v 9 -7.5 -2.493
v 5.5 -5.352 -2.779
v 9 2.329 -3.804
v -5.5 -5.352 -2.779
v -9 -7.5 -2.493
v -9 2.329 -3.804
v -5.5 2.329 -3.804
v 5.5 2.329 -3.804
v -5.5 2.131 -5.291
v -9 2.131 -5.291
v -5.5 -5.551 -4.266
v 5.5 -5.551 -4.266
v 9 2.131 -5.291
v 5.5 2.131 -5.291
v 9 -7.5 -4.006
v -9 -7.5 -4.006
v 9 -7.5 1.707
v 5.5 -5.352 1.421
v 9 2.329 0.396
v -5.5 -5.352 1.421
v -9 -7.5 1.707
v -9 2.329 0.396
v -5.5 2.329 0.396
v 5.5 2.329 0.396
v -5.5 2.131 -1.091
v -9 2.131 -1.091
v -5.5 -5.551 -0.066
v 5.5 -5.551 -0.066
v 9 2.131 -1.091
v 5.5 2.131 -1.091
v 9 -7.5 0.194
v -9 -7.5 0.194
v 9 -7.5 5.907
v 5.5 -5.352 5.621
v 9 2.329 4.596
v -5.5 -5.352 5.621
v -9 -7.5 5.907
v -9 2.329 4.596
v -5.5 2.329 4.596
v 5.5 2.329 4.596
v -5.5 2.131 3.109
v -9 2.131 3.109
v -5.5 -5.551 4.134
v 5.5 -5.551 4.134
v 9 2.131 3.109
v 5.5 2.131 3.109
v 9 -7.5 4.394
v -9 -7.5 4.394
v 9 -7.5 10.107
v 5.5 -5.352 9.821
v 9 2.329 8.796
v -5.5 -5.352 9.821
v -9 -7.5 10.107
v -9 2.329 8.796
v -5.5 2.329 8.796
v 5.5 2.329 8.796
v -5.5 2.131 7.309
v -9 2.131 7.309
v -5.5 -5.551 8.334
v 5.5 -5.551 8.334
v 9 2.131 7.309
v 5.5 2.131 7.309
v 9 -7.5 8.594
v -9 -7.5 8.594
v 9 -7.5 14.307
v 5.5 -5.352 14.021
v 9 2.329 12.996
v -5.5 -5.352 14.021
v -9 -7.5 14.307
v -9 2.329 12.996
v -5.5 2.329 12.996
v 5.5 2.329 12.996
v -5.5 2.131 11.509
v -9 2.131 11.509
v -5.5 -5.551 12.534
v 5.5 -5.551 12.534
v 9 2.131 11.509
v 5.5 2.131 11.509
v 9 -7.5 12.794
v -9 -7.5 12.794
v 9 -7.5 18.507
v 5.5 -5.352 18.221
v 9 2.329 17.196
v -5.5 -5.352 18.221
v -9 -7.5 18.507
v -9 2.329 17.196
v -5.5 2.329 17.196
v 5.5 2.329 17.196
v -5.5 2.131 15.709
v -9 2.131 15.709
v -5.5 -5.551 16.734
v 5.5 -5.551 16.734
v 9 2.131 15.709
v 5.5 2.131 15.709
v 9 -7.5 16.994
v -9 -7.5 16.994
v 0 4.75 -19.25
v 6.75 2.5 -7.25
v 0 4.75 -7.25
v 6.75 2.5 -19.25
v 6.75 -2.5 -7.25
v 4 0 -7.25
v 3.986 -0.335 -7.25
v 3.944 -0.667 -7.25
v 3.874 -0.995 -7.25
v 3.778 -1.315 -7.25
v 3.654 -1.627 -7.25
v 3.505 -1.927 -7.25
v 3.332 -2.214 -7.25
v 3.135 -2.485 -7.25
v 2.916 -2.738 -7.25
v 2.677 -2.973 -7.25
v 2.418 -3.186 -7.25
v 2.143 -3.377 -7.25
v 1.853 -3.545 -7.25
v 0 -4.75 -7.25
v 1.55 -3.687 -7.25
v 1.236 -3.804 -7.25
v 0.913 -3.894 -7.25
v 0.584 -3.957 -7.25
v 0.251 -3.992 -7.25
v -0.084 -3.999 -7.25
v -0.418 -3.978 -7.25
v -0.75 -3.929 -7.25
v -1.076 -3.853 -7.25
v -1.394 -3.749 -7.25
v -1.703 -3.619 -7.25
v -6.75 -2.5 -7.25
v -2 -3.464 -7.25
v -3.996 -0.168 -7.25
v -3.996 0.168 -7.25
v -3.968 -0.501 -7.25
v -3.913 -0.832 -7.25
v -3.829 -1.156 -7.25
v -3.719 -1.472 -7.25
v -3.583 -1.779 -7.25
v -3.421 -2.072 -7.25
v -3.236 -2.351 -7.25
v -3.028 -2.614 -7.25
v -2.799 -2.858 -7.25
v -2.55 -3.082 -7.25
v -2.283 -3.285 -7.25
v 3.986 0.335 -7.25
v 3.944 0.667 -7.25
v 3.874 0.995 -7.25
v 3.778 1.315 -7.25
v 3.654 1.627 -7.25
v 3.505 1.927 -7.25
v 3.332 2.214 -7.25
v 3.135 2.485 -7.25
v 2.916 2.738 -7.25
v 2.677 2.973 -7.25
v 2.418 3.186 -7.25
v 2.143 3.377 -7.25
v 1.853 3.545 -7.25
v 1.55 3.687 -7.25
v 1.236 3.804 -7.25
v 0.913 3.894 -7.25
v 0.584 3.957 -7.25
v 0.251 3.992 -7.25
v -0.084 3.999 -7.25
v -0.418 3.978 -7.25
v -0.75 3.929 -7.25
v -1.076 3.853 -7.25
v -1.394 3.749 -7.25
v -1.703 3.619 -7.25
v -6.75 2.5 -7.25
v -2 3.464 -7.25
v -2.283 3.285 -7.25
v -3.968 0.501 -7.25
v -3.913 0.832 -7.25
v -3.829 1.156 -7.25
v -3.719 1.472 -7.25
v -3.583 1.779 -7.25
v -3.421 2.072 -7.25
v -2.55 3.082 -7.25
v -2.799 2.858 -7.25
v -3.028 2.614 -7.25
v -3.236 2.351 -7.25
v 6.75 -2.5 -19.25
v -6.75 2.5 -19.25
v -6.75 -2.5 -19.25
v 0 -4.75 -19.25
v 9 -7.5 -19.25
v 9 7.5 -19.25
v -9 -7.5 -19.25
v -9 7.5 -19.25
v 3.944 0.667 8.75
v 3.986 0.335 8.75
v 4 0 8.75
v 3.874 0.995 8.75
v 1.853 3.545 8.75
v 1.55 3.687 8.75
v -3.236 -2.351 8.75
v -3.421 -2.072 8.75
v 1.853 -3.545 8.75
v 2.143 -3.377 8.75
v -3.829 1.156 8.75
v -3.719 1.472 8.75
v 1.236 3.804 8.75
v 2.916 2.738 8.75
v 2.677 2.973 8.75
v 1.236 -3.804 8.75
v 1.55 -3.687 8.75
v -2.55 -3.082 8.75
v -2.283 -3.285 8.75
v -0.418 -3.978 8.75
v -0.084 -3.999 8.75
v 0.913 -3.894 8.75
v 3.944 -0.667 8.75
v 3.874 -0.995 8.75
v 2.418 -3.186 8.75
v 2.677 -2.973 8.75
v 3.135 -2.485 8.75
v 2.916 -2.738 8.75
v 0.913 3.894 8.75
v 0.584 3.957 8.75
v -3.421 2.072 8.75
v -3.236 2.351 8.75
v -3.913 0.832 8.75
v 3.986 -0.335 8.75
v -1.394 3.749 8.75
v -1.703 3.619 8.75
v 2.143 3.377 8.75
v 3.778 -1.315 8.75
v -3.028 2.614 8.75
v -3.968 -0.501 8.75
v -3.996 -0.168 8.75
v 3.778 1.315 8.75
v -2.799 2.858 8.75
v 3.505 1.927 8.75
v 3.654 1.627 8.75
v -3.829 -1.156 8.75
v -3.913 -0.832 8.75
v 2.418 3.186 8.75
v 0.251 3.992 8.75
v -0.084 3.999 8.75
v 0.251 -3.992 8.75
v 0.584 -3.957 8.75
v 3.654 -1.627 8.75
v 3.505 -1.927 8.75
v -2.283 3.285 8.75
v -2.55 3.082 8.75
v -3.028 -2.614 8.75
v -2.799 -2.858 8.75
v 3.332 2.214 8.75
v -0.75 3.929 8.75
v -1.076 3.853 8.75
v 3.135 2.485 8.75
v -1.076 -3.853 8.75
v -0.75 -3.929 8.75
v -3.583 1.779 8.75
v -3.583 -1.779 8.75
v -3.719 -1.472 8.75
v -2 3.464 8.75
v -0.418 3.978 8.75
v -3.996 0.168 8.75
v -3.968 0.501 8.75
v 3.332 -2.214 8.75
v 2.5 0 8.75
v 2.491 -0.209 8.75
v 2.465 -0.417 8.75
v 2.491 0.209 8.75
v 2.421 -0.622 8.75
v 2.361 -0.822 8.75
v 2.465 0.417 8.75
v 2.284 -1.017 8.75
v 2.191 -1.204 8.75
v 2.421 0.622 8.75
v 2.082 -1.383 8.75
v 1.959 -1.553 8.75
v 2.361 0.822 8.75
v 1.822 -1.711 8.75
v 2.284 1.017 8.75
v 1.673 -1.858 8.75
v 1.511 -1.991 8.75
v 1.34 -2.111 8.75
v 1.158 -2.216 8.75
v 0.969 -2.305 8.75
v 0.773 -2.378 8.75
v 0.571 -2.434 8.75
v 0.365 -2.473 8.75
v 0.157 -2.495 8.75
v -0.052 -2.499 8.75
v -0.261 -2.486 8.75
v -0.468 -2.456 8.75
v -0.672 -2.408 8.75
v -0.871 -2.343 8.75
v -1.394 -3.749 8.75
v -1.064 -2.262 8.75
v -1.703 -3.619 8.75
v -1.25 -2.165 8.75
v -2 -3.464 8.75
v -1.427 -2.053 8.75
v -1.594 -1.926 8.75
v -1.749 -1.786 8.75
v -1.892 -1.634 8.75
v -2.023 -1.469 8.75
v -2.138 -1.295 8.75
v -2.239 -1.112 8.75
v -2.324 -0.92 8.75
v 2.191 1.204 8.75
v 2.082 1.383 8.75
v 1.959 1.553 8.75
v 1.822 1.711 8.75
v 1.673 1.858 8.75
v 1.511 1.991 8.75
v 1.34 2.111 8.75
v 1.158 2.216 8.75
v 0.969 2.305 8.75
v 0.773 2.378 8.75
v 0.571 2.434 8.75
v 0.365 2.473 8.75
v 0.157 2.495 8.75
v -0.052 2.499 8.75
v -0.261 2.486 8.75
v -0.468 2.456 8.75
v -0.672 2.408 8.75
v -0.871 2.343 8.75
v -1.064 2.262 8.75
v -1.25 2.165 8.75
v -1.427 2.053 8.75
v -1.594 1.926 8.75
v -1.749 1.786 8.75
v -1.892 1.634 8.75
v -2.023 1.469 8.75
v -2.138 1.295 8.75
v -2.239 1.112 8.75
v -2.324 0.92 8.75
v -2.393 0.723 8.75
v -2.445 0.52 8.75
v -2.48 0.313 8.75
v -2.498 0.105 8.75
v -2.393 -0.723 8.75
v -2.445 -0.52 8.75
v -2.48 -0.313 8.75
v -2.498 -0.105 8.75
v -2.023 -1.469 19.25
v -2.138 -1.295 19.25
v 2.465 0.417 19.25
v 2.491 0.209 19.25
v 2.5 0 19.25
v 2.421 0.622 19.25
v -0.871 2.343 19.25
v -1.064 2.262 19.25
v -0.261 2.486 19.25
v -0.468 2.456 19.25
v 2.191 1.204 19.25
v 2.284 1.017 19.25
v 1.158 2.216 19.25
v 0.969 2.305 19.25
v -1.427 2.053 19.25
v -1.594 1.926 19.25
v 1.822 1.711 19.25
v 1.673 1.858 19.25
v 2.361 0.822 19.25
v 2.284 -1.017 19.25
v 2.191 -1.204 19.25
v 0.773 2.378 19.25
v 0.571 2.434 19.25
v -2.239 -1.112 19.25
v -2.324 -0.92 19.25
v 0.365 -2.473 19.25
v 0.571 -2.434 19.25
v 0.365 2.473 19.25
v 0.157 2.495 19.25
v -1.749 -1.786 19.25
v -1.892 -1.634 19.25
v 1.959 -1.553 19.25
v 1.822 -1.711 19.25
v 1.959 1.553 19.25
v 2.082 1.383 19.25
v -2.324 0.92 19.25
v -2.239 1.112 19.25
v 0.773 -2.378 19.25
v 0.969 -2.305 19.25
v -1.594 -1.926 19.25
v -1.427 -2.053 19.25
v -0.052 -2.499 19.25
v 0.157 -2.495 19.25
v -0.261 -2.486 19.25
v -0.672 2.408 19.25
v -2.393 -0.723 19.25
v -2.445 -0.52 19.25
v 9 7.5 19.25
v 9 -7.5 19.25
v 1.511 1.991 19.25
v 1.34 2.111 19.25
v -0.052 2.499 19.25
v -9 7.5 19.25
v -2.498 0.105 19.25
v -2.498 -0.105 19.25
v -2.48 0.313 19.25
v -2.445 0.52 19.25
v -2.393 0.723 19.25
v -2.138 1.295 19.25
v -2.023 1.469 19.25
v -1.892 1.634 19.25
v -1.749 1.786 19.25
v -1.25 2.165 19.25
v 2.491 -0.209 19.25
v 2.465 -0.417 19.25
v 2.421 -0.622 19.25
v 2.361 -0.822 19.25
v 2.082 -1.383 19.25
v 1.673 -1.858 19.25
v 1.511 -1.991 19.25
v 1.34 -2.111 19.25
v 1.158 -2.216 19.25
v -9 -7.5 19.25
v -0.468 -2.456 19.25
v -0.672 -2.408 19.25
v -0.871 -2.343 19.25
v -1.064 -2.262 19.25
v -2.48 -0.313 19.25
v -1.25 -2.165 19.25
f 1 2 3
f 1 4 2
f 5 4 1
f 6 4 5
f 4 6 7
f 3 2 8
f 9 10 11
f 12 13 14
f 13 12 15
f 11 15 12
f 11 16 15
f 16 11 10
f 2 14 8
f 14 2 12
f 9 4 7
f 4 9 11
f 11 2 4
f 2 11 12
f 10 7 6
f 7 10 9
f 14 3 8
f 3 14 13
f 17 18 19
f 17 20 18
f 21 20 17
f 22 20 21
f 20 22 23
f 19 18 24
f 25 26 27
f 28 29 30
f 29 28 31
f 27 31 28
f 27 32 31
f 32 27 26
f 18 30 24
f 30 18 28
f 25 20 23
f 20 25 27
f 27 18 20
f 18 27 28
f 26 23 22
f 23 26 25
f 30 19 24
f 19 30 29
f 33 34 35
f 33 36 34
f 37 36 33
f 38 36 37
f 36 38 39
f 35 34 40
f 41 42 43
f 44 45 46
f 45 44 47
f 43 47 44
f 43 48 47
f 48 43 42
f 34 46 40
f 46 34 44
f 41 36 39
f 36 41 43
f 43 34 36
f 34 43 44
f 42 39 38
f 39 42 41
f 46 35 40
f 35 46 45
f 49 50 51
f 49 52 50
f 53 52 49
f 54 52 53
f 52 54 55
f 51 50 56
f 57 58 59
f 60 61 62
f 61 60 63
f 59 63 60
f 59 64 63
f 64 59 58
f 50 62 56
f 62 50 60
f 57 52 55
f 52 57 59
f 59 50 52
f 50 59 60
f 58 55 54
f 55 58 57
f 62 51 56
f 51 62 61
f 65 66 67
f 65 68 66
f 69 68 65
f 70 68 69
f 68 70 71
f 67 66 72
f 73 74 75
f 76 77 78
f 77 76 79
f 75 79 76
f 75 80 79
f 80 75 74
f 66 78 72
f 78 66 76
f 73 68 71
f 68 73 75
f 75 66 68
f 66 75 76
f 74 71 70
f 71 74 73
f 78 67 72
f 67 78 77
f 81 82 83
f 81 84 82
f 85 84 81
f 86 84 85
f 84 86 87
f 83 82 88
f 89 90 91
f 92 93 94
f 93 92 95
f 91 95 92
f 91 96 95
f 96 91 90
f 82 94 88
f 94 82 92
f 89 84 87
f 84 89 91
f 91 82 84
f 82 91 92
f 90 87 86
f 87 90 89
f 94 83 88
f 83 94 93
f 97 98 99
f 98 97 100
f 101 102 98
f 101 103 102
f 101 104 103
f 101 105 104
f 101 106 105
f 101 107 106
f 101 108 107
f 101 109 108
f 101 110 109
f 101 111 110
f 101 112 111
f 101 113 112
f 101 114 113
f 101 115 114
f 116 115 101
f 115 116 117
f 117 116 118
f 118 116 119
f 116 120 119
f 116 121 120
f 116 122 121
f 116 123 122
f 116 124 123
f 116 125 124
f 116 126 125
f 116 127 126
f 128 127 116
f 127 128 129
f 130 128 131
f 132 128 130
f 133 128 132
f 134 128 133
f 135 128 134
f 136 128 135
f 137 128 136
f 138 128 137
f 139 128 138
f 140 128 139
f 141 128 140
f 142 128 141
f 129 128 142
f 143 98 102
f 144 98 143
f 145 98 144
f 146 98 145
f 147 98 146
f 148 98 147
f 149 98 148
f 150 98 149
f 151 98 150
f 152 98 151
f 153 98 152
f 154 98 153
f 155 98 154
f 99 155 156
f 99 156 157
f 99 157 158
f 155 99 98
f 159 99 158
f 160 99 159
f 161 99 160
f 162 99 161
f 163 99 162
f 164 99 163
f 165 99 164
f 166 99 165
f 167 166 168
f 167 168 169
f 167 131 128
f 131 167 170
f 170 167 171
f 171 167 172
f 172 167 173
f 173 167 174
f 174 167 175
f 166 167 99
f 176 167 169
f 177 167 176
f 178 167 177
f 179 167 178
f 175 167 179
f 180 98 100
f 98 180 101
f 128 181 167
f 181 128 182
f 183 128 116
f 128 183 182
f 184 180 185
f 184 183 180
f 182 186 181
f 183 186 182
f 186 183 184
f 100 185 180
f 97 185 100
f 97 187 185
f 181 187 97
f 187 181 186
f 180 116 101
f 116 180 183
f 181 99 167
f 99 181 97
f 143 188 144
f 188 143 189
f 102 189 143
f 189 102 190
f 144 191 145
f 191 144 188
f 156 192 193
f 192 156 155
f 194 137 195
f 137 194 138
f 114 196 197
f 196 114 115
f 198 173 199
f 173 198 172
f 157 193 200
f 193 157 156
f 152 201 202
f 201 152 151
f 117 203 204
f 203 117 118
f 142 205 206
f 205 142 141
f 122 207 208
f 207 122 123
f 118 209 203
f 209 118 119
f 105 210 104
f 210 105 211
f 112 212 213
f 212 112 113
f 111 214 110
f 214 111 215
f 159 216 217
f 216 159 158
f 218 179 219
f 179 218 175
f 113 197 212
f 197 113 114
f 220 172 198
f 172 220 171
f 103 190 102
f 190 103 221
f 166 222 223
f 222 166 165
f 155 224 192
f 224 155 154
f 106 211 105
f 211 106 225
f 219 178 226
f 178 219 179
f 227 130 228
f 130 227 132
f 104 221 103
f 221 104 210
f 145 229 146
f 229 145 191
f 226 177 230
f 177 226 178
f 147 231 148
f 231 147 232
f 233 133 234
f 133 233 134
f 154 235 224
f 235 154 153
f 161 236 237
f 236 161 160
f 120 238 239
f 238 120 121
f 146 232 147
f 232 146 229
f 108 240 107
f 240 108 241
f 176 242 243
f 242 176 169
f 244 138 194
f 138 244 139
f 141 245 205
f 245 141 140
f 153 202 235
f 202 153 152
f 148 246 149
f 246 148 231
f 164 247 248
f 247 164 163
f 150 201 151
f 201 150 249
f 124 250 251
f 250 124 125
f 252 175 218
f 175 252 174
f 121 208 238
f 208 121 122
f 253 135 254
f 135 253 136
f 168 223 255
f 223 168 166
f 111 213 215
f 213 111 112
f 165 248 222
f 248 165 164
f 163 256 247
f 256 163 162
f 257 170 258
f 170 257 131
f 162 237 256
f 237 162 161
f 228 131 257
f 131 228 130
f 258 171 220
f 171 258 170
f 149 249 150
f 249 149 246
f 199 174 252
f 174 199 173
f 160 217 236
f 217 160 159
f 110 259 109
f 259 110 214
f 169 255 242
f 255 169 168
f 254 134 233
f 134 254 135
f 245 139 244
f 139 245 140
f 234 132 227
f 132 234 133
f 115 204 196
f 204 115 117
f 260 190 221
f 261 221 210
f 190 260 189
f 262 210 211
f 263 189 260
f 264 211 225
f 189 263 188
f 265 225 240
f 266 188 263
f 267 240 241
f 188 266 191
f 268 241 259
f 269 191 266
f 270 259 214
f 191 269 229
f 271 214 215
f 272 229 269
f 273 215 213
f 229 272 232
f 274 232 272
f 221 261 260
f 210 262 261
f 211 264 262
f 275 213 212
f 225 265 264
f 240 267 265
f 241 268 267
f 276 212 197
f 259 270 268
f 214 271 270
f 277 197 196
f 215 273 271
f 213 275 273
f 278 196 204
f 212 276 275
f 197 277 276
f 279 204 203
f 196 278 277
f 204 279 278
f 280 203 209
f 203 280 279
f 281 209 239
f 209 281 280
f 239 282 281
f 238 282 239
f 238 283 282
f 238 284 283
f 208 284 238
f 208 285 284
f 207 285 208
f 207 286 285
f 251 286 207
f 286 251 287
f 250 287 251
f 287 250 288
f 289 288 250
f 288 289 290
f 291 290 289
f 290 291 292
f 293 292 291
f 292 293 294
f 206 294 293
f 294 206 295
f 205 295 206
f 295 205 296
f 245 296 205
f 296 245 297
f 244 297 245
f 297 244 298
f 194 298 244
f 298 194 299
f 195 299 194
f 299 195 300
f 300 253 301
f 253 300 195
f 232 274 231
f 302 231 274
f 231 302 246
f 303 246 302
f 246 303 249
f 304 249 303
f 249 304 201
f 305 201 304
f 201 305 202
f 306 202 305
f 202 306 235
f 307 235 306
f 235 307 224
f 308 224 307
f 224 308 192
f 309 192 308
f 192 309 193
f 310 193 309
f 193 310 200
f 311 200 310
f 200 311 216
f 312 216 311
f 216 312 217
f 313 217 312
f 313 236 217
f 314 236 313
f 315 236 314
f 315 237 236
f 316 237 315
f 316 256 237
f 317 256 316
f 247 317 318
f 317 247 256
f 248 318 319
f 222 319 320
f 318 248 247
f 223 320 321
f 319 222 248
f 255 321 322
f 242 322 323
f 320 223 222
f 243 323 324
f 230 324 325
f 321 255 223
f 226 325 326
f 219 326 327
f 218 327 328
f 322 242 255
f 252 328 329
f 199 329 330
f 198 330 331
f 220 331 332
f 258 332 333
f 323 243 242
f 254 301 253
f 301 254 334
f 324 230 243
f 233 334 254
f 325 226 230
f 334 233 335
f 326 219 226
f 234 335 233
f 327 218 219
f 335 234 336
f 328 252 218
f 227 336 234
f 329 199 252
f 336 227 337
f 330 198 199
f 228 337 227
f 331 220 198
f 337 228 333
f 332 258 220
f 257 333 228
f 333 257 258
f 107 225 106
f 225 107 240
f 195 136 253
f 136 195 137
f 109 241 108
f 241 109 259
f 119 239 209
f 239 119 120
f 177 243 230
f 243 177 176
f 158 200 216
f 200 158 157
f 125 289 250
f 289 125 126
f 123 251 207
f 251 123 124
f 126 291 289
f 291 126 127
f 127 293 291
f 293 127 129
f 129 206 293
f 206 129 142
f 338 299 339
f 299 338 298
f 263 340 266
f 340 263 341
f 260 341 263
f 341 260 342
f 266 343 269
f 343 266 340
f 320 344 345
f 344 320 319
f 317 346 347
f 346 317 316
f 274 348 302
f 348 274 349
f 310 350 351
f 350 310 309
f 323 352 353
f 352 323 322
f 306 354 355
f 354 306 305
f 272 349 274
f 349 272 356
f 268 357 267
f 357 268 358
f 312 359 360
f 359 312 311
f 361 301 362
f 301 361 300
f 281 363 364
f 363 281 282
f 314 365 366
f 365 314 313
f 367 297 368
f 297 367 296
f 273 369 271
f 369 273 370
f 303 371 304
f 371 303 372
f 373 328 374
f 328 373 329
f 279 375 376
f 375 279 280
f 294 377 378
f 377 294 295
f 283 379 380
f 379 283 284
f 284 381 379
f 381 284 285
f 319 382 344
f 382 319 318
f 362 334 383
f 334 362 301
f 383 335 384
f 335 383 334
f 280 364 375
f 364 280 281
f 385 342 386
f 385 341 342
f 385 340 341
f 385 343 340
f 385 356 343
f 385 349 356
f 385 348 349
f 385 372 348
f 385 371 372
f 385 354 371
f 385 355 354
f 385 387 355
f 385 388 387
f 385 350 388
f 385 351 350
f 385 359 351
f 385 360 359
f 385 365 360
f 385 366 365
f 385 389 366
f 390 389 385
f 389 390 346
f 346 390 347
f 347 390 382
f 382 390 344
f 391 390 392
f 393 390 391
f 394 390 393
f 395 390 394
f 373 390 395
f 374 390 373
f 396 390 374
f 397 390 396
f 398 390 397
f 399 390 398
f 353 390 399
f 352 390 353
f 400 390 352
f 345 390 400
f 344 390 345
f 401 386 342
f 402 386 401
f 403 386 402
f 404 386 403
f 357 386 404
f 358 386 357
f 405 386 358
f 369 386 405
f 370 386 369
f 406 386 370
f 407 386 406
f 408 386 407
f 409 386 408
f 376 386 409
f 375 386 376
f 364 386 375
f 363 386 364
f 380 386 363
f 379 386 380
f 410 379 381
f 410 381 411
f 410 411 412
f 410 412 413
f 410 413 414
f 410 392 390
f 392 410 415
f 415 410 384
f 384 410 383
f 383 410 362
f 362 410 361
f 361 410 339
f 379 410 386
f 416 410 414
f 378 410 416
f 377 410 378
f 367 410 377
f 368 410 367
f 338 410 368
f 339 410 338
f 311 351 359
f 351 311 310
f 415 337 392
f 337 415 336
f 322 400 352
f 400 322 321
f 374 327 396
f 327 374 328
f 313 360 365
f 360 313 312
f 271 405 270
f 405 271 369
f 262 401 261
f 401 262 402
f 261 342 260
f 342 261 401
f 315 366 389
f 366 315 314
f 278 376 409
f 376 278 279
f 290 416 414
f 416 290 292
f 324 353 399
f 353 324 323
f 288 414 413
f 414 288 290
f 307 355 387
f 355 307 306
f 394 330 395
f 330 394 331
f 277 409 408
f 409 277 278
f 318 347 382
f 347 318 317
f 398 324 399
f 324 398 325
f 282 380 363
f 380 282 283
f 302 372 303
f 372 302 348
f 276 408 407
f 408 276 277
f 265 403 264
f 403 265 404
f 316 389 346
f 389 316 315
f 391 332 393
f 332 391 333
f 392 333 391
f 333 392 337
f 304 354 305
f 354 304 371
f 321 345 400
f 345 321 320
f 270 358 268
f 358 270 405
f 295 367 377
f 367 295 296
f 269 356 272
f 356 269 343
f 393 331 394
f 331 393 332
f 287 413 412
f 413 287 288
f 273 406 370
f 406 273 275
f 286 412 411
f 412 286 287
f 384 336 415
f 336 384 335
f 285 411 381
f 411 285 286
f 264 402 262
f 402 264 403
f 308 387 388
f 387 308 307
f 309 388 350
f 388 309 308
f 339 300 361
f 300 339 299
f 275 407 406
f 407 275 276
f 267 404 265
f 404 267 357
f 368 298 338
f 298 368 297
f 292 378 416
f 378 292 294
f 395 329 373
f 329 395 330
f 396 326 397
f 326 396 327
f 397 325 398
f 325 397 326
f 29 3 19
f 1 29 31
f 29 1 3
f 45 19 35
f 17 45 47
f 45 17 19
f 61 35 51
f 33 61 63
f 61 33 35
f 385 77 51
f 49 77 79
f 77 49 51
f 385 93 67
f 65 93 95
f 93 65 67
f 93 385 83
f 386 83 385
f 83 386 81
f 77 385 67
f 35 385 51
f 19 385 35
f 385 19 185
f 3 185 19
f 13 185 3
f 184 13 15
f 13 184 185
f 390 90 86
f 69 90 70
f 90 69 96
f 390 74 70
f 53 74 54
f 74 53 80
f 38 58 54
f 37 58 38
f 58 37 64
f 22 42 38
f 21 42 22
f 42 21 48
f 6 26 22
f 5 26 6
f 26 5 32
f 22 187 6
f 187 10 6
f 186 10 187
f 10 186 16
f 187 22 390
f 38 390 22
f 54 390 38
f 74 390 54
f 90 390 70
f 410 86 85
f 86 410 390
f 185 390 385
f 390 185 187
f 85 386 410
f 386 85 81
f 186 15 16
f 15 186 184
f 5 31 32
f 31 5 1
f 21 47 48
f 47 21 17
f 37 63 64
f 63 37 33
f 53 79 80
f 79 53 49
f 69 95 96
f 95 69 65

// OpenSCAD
$fn = 75;

female_width = 18;
female_depth = 15;
female_height = 38.5;

cut_width = 3.5;
cut_depth = 2;
cut_height = 1.5;
cut_leaning = -7.6;
cut_stop_depth = 5.5;

cut_begin = 15;
distance_between_cuts = 4.2;

male_width = 13.5;
male_depth1 = 9.5;
male_depth2 = 5;

male_height = 12;

spring_hole_d = 8;
spring_hole_height = 28;

line_hole_d = 5;


difference() {
    base();
    union() {
        cuts();
        male();
        spring_hole();
        line_hole();
    };
};

module line_hole() {
    cylinder(r1=line_hole_d/2, r2=line_hole_d/2, h=female_height, center=true);
};

module spring_hole() {
    translate([0, 0, -(female_height-spring_hole_height)/2])
    cylinder(r1=spring_hole_d/2, r2=spring_hole_d/2, h=spring_hole_height, center=true);
};

module base() {
    cube([female_width, female_depth, female_height], center=true);
};

module cuts() {
    num = floor((female_height - cut_begin) / distance_between_cuts);
    for(i = [0:num]) {
        echo(i * distance_between_cuts);
        translate([0, 0, -(female_height/2) + cut_begin + (i * distance_between_cuts)])
        cut();
    };
};

module cut() {
    big_depth = female_depth + 2.5 - cut_depth;
    
    rotate([cut_leaning, 0, 0])
    difference() {
        cube([female_width+5, female_depth+5, cut_height], center=true);
        translate([0, cut_depth/2 + 1.25, 0])
        cube(
            [
                female_width - 2 * cut_width,
                big_depth,
                cut_height
            ],
            center=true
        );
        translate(
            [
                0,
                (big_depth-cut_stop_depth+2.5)/2,
                0
            ]
        )
        cube(
            [
                female_width+5,
                cut_stop_depth + 2.5,
                cut_height
            ],
            center=true
        );
    };
};

module male() {
    x = male_width/2;
    y1 = male_depth1/2;
    y2 = male_depth2/2;
    
    translate([0, 0, -(female_height-male_height)/2])
    translate([0, 0, -male_height/2])
    linear_extrude(height=male_height)
    polygon(
        [
            [-x, y2],
            [0, y1],
            [x, y2],
            [x, -y2],
            [0, -y1],
            [-x, -y2]
        ]
    );
};
